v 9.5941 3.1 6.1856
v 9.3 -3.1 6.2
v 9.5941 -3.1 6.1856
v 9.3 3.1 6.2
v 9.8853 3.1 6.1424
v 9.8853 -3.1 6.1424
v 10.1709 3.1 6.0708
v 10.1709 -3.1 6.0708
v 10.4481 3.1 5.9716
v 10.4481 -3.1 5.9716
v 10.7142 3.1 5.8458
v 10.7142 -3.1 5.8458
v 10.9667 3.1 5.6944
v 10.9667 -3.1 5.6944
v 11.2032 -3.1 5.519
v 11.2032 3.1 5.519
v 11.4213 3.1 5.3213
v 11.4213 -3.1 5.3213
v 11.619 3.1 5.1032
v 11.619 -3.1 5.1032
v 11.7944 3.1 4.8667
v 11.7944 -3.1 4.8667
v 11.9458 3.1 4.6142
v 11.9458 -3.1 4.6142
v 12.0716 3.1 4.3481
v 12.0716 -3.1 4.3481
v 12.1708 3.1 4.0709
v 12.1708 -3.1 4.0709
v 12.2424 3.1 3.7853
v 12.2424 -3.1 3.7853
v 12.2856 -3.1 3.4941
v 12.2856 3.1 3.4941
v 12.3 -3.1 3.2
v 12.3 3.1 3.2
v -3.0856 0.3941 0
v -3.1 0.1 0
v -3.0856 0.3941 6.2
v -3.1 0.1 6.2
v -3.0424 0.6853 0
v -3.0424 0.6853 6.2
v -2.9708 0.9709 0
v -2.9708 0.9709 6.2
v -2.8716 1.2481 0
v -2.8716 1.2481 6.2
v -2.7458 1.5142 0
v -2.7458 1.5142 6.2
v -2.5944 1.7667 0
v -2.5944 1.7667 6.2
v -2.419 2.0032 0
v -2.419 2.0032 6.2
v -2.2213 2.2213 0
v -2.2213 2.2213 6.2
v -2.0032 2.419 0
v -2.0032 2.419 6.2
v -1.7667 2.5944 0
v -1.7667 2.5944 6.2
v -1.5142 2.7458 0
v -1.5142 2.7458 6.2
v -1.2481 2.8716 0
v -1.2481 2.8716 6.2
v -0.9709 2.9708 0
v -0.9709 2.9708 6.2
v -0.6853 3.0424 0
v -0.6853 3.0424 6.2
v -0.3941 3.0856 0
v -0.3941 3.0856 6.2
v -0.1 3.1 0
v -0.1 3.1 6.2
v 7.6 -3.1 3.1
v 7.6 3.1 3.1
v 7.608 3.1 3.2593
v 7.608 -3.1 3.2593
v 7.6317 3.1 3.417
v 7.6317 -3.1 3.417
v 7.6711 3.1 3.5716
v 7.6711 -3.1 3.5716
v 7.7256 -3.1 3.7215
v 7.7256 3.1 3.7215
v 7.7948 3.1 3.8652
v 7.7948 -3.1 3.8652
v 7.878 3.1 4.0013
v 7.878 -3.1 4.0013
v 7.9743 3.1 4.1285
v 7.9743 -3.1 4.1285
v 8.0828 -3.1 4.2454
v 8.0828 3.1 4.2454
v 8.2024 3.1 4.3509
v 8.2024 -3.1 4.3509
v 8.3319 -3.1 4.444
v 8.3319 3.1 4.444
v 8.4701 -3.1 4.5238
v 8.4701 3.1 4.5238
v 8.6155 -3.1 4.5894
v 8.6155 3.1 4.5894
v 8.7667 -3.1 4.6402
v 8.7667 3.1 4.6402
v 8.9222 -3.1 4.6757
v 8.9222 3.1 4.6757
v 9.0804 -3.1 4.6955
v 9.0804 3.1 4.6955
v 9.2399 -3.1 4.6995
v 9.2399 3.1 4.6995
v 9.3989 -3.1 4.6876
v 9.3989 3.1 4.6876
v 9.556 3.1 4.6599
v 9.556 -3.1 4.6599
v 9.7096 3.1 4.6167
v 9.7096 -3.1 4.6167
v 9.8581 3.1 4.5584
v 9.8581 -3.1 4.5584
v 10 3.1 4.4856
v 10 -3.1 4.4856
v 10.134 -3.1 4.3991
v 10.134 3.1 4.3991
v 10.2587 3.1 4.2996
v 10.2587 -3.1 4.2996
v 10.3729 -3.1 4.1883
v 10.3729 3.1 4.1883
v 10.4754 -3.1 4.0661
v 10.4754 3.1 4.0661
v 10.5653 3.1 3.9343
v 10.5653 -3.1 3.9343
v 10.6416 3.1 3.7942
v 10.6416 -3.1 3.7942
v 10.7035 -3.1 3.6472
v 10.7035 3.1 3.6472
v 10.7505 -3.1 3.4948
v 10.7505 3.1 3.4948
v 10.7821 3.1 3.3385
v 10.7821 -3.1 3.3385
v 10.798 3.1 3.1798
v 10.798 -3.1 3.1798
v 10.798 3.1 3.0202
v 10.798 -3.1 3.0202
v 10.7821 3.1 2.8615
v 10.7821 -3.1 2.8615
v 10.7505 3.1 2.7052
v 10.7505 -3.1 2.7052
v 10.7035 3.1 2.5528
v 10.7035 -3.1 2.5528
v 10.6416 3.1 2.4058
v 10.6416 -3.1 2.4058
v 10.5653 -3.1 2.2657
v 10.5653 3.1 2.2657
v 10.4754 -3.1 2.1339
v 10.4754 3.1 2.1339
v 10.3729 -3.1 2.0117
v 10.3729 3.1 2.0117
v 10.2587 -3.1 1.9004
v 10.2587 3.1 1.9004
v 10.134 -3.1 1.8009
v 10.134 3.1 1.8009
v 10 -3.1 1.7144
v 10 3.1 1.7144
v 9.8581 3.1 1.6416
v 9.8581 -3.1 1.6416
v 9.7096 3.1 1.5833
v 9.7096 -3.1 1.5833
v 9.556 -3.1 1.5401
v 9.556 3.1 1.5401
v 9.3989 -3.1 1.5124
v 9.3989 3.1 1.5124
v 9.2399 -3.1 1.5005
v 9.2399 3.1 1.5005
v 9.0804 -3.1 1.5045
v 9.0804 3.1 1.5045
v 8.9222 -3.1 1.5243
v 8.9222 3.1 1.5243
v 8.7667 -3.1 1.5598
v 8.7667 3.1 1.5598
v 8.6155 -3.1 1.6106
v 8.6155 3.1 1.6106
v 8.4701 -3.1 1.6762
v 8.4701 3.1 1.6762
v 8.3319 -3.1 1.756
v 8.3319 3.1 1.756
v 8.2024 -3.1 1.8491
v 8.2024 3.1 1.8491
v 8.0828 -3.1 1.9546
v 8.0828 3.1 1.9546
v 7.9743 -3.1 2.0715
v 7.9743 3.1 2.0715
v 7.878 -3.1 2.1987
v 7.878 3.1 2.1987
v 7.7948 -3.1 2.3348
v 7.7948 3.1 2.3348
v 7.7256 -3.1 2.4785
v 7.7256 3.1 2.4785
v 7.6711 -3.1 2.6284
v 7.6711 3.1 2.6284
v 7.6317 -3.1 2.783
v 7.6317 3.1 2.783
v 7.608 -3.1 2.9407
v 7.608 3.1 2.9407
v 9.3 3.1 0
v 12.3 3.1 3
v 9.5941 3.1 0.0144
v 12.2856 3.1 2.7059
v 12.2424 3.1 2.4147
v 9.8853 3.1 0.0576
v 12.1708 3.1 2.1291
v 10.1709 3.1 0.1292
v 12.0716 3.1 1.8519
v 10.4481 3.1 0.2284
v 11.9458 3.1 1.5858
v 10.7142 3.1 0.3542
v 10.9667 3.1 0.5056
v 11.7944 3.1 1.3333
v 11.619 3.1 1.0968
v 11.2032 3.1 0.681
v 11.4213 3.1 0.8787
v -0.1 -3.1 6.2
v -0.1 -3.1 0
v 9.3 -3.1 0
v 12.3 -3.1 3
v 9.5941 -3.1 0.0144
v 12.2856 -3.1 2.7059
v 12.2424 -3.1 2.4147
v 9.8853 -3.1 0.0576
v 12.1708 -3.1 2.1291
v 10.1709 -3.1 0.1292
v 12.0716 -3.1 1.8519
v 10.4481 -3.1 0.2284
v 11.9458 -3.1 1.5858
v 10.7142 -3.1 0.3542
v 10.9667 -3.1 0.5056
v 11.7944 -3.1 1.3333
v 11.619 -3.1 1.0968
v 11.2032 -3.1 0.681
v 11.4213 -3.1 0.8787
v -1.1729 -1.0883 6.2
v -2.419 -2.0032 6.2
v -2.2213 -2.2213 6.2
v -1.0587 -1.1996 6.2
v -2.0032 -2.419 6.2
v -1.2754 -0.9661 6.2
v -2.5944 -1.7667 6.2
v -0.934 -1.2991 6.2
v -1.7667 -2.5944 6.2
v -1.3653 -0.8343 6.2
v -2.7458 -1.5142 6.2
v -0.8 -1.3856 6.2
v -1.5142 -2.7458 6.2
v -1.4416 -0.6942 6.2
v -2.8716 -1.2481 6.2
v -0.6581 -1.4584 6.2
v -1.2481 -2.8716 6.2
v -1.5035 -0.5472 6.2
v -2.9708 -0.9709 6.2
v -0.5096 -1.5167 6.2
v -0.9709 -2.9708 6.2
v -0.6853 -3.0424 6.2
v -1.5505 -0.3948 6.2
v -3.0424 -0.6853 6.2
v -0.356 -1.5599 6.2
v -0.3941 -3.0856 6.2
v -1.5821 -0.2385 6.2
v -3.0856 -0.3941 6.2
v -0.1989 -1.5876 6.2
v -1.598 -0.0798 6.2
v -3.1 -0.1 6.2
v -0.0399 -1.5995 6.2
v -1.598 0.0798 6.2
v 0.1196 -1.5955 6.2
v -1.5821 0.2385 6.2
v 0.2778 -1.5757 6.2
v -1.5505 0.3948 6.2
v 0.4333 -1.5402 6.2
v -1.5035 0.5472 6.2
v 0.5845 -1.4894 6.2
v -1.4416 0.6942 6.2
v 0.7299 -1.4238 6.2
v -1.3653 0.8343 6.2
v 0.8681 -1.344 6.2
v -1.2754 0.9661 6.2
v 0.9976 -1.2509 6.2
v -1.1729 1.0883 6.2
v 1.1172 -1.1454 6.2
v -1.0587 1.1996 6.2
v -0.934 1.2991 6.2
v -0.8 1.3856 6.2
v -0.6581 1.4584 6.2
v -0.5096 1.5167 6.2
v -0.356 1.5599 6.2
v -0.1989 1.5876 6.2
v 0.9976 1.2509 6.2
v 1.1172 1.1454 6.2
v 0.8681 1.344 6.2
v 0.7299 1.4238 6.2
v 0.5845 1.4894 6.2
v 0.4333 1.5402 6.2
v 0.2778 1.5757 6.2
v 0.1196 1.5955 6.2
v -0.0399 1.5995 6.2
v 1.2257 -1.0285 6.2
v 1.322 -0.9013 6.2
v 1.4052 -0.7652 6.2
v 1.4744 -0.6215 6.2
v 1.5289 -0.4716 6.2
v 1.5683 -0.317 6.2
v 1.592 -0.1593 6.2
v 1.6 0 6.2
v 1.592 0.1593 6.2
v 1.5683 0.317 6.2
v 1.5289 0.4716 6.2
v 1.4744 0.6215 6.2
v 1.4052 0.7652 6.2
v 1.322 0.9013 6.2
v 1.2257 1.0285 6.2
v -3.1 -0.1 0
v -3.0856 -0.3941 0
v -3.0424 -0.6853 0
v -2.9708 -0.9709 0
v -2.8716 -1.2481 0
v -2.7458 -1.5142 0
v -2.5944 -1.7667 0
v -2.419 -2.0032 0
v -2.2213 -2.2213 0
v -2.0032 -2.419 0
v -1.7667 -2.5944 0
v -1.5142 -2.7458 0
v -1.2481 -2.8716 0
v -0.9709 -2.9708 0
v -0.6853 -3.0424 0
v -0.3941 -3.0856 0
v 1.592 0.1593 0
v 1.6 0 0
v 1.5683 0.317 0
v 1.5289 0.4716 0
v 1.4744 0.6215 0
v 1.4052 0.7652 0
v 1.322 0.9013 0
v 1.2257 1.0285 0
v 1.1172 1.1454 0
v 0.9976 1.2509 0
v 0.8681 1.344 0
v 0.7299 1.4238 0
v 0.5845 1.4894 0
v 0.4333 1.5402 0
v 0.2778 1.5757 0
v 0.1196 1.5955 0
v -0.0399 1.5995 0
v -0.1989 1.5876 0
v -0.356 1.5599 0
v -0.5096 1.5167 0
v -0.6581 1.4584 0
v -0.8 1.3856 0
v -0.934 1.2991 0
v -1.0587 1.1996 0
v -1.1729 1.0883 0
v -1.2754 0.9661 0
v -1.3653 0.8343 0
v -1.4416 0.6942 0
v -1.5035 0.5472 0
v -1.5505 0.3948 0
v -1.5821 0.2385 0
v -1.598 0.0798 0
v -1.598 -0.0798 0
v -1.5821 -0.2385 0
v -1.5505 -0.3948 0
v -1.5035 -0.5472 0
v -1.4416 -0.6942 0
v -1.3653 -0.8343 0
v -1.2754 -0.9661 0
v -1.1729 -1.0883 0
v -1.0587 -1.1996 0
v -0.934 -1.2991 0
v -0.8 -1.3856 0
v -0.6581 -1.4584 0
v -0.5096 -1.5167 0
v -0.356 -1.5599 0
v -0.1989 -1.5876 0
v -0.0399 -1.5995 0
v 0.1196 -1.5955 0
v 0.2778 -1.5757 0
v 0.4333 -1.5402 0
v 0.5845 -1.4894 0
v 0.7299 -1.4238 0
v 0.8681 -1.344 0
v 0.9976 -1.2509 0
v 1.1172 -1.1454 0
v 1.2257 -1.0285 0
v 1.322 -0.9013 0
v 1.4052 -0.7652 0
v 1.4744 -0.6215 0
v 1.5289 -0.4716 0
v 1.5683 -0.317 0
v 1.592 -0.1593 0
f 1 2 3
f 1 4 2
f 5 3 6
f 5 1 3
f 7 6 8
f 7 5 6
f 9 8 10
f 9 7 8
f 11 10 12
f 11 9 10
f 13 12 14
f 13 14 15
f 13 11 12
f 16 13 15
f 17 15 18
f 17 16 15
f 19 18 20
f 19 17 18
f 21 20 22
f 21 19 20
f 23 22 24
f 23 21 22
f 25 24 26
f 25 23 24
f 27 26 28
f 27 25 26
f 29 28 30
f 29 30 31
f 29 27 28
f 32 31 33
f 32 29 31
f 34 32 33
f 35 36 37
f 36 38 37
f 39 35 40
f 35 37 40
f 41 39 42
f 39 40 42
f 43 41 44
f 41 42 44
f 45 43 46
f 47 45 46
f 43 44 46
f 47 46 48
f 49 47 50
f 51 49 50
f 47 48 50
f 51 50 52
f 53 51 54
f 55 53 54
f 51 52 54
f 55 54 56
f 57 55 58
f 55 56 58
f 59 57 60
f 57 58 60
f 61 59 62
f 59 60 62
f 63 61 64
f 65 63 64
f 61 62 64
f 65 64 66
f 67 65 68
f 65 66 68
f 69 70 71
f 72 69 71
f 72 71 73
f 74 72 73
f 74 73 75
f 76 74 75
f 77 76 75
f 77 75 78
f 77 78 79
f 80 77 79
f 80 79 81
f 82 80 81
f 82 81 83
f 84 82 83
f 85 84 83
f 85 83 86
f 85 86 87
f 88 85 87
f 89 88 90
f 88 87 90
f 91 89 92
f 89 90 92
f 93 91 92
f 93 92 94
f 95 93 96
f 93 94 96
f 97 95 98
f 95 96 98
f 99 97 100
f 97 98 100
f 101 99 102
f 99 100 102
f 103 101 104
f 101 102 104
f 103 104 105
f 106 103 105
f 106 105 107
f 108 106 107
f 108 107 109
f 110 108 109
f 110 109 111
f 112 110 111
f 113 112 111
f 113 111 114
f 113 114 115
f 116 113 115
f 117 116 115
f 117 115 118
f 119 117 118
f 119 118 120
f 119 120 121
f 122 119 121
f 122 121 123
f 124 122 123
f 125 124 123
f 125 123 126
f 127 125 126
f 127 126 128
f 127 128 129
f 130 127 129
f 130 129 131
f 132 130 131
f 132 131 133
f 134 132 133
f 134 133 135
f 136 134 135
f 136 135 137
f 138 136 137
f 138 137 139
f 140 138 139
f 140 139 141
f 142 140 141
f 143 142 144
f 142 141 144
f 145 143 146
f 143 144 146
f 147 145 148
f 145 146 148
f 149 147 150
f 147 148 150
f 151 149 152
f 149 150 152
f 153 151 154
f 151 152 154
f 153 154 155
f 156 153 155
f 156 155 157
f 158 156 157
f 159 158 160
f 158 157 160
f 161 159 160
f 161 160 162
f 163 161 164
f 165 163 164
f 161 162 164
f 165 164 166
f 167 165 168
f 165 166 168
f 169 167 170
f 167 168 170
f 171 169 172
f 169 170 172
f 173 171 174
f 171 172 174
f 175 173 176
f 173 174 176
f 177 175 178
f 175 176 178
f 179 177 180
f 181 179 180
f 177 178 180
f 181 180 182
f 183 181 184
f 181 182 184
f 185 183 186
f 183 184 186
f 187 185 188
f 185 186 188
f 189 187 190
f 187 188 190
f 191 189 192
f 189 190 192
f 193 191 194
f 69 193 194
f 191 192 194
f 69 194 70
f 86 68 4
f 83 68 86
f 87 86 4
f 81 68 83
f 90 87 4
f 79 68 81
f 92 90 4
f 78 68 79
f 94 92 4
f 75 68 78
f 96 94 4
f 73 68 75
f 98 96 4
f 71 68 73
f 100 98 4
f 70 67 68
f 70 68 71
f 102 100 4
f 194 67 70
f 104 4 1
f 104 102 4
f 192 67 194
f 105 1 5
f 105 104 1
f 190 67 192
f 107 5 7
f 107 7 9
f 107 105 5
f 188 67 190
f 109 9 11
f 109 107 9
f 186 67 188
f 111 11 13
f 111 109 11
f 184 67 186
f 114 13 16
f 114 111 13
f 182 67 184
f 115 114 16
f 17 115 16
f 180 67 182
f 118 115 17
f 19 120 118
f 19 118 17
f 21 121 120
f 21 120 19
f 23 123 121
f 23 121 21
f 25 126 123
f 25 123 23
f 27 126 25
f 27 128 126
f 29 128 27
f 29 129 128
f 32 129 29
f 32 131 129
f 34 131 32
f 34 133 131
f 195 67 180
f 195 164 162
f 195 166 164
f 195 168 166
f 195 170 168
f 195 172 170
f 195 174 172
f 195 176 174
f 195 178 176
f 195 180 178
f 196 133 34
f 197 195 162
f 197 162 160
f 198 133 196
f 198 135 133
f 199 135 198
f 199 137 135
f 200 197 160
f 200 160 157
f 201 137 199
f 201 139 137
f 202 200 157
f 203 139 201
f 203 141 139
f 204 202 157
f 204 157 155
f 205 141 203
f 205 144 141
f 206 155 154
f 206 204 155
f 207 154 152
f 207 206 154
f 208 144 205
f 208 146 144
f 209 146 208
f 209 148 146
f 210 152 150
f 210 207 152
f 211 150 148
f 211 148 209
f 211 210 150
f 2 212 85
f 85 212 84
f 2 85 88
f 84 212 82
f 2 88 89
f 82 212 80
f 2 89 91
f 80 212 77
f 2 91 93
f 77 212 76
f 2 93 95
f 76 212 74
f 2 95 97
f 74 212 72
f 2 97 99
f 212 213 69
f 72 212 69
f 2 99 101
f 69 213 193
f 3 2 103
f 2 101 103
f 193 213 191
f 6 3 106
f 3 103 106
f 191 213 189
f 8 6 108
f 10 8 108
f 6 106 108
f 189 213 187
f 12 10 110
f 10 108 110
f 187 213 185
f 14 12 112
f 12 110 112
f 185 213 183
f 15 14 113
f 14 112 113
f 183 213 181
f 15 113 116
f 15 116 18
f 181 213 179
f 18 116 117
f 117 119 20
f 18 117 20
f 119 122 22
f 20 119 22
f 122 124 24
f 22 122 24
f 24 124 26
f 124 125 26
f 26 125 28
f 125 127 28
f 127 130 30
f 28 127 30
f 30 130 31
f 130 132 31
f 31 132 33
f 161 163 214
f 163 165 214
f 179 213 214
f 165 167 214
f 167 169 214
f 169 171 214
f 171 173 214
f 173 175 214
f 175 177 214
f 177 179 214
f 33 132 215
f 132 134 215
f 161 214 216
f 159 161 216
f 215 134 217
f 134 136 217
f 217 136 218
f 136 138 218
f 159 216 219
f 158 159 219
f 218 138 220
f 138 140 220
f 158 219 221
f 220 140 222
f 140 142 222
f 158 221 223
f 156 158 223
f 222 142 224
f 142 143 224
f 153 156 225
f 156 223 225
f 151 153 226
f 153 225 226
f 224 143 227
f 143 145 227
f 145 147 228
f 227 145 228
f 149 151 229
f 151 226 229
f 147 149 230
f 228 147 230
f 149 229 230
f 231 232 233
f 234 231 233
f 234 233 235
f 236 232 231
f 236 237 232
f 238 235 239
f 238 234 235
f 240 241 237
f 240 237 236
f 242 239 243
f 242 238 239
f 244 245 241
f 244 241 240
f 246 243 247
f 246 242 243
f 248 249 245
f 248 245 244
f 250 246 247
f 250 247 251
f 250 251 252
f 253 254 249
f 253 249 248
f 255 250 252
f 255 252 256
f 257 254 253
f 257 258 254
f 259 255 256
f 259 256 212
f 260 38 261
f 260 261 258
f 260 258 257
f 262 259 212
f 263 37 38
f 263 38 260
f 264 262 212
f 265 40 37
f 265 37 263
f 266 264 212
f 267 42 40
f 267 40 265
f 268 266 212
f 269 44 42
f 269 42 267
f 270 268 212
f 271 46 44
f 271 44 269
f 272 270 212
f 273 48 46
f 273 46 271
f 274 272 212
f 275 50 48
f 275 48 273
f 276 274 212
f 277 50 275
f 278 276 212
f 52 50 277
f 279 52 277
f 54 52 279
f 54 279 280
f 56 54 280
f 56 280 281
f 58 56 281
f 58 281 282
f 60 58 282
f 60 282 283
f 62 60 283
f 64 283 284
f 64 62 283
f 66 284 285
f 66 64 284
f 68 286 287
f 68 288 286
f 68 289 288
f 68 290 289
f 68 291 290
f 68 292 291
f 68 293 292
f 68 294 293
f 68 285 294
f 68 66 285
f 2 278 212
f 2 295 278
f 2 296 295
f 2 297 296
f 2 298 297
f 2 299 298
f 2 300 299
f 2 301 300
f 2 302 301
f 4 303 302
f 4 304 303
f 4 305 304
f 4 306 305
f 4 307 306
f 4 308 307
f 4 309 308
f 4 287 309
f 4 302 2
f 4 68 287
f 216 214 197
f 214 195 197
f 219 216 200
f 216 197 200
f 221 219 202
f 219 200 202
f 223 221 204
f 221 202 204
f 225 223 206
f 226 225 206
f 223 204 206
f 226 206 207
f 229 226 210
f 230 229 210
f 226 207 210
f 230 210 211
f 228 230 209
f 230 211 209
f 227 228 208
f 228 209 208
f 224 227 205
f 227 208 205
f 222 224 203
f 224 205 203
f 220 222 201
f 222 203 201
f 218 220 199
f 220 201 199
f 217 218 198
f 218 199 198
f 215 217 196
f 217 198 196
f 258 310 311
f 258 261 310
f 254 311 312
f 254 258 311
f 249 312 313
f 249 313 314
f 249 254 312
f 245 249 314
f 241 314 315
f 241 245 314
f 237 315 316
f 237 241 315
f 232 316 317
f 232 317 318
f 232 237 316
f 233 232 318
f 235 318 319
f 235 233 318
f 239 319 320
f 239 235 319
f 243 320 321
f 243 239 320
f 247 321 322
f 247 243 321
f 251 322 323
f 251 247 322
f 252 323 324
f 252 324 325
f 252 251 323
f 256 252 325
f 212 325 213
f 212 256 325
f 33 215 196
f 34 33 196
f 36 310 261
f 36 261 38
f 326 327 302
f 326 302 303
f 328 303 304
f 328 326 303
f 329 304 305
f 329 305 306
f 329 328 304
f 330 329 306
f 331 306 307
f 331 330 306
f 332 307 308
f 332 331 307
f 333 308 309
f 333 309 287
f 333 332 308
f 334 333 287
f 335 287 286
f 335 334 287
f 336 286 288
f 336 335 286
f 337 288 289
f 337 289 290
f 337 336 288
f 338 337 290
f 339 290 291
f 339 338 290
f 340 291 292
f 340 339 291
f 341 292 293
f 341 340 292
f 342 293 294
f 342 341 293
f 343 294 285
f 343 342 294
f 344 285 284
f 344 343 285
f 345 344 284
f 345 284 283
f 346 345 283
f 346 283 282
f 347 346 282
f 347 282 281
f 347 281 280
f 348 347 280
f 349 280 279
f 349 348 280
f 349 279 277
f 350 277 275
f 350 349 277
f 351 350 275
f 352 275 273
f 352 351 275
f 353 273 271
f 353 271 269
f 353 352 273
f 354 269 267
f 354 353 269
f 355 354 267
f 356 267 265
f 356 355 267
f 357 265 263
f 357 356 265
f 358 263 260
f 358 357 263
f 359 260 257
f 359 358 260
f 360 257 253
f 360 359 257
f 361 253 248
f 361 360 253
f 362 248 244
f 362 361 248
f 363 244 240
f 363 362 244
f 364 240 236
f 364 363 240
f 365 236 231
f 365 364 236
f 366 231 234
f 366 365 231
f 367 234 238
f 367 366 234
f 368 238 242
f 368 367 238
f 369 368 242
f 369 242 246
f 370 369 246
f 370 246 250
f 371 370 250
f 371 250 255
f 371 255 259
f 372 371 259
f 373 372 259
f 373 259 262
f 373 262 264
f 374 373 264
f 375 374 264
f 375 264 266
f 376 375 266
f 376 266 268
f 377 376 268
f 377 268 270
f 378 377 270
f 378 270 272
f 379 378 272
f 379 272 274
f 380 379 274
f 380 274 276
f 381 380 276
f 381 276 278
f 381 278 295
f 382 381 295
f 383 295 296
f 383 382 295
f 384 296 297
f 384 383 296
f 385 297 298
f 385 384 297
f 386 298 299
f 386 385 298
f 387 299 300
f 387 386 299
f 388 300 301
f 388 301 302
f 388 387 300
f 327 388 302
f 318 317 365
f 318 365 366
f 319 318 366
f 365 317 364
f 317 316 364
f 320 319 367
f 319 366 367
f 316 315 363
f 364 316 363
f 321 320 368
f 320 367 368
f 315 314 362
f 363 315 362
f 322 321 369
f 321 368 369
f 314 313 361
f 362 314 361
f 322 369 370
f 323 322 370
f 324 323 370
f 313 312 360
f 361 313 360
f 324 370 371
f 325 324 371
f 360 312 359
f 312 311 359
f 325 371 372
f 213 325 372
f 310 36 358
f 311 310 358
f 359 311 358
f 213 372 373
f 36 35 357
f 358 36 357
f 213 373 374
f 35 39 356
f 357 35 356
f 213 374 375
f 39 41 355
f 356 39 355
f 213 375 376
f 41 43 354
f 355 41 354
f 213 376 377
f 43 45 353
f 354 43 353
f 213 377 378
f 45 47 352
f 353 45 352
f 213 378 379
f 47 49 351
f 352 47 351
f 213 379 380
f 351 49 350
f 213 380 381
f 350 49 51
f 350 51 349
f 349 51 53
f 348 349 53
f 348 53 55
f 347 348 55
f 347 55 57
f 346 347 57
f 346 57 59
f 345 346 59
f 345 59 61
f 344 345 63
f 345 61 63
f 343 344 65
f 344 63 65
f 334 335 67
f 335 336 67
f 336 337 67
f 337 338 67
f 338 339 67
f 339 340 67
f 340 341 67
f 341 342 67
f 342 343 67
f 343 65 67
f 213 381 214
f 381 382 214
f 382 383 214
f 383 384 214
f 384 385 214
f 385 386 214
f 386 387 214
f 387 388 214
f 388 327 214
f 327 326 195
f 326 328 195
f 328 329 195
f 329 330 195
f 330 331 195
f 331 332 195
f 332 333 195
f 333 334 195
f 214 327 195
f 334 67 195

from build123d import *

# Parameters (mm, degrees)
SKETCH_W     = 15.4
SKETCH_H     = 6.2
SKETCH_R     = 1.6
PAD_DEPTH    = 6.2
SKETCH001_R  = 1.6
POCKET_DEPTH = 6.201
FILLET_R     = 3
FILLET001_R  = 3


with BuildPart() as part:
    # Sketch → Pad (new body)
    with BuildSketch(Plane.XY):
        with Locations((4.6, 0)):
            Rectangle(SKETCH_W, SKETCH_H)
        Circle(SKETCH_R, mode=Mode.SUBTRACT)
    extrude(amount=PAD_DEPTH)

    # Sketch001 (on Face1 of Pad) → Pocket (cut, through all)
    with BuildSketch(Plane(origin=(0, 3.1, 0), x_dir=(-1, 0, 0), z_dir=(0, 1, 0))):
        with Locations((-9.2, 3.1)):
            Circle(SKETCH001_R)
    extrude(amount=-POCKET_DEPTH, mode=Mode.SUBTRACT)

    # Fillet
    fillet_edges = [part.edges().sort_by_distance(p)[0] for p in [
        (-3.1, -3.1, 3.1),
        (-3.1, 3.1, 3.1),
    ]]
    fillet(fillet_edges, radius=FILLET_R)

    # Fillet001
    fillet001_edges = [part.edges().sort_by_distance(p)[0] for p in [
        (12.3, 0, 6.2),
        (12.3, 0, 0),
    ]]
    fillet(fillet001_edges, radius=FILLET001_R)


solid = part.part
